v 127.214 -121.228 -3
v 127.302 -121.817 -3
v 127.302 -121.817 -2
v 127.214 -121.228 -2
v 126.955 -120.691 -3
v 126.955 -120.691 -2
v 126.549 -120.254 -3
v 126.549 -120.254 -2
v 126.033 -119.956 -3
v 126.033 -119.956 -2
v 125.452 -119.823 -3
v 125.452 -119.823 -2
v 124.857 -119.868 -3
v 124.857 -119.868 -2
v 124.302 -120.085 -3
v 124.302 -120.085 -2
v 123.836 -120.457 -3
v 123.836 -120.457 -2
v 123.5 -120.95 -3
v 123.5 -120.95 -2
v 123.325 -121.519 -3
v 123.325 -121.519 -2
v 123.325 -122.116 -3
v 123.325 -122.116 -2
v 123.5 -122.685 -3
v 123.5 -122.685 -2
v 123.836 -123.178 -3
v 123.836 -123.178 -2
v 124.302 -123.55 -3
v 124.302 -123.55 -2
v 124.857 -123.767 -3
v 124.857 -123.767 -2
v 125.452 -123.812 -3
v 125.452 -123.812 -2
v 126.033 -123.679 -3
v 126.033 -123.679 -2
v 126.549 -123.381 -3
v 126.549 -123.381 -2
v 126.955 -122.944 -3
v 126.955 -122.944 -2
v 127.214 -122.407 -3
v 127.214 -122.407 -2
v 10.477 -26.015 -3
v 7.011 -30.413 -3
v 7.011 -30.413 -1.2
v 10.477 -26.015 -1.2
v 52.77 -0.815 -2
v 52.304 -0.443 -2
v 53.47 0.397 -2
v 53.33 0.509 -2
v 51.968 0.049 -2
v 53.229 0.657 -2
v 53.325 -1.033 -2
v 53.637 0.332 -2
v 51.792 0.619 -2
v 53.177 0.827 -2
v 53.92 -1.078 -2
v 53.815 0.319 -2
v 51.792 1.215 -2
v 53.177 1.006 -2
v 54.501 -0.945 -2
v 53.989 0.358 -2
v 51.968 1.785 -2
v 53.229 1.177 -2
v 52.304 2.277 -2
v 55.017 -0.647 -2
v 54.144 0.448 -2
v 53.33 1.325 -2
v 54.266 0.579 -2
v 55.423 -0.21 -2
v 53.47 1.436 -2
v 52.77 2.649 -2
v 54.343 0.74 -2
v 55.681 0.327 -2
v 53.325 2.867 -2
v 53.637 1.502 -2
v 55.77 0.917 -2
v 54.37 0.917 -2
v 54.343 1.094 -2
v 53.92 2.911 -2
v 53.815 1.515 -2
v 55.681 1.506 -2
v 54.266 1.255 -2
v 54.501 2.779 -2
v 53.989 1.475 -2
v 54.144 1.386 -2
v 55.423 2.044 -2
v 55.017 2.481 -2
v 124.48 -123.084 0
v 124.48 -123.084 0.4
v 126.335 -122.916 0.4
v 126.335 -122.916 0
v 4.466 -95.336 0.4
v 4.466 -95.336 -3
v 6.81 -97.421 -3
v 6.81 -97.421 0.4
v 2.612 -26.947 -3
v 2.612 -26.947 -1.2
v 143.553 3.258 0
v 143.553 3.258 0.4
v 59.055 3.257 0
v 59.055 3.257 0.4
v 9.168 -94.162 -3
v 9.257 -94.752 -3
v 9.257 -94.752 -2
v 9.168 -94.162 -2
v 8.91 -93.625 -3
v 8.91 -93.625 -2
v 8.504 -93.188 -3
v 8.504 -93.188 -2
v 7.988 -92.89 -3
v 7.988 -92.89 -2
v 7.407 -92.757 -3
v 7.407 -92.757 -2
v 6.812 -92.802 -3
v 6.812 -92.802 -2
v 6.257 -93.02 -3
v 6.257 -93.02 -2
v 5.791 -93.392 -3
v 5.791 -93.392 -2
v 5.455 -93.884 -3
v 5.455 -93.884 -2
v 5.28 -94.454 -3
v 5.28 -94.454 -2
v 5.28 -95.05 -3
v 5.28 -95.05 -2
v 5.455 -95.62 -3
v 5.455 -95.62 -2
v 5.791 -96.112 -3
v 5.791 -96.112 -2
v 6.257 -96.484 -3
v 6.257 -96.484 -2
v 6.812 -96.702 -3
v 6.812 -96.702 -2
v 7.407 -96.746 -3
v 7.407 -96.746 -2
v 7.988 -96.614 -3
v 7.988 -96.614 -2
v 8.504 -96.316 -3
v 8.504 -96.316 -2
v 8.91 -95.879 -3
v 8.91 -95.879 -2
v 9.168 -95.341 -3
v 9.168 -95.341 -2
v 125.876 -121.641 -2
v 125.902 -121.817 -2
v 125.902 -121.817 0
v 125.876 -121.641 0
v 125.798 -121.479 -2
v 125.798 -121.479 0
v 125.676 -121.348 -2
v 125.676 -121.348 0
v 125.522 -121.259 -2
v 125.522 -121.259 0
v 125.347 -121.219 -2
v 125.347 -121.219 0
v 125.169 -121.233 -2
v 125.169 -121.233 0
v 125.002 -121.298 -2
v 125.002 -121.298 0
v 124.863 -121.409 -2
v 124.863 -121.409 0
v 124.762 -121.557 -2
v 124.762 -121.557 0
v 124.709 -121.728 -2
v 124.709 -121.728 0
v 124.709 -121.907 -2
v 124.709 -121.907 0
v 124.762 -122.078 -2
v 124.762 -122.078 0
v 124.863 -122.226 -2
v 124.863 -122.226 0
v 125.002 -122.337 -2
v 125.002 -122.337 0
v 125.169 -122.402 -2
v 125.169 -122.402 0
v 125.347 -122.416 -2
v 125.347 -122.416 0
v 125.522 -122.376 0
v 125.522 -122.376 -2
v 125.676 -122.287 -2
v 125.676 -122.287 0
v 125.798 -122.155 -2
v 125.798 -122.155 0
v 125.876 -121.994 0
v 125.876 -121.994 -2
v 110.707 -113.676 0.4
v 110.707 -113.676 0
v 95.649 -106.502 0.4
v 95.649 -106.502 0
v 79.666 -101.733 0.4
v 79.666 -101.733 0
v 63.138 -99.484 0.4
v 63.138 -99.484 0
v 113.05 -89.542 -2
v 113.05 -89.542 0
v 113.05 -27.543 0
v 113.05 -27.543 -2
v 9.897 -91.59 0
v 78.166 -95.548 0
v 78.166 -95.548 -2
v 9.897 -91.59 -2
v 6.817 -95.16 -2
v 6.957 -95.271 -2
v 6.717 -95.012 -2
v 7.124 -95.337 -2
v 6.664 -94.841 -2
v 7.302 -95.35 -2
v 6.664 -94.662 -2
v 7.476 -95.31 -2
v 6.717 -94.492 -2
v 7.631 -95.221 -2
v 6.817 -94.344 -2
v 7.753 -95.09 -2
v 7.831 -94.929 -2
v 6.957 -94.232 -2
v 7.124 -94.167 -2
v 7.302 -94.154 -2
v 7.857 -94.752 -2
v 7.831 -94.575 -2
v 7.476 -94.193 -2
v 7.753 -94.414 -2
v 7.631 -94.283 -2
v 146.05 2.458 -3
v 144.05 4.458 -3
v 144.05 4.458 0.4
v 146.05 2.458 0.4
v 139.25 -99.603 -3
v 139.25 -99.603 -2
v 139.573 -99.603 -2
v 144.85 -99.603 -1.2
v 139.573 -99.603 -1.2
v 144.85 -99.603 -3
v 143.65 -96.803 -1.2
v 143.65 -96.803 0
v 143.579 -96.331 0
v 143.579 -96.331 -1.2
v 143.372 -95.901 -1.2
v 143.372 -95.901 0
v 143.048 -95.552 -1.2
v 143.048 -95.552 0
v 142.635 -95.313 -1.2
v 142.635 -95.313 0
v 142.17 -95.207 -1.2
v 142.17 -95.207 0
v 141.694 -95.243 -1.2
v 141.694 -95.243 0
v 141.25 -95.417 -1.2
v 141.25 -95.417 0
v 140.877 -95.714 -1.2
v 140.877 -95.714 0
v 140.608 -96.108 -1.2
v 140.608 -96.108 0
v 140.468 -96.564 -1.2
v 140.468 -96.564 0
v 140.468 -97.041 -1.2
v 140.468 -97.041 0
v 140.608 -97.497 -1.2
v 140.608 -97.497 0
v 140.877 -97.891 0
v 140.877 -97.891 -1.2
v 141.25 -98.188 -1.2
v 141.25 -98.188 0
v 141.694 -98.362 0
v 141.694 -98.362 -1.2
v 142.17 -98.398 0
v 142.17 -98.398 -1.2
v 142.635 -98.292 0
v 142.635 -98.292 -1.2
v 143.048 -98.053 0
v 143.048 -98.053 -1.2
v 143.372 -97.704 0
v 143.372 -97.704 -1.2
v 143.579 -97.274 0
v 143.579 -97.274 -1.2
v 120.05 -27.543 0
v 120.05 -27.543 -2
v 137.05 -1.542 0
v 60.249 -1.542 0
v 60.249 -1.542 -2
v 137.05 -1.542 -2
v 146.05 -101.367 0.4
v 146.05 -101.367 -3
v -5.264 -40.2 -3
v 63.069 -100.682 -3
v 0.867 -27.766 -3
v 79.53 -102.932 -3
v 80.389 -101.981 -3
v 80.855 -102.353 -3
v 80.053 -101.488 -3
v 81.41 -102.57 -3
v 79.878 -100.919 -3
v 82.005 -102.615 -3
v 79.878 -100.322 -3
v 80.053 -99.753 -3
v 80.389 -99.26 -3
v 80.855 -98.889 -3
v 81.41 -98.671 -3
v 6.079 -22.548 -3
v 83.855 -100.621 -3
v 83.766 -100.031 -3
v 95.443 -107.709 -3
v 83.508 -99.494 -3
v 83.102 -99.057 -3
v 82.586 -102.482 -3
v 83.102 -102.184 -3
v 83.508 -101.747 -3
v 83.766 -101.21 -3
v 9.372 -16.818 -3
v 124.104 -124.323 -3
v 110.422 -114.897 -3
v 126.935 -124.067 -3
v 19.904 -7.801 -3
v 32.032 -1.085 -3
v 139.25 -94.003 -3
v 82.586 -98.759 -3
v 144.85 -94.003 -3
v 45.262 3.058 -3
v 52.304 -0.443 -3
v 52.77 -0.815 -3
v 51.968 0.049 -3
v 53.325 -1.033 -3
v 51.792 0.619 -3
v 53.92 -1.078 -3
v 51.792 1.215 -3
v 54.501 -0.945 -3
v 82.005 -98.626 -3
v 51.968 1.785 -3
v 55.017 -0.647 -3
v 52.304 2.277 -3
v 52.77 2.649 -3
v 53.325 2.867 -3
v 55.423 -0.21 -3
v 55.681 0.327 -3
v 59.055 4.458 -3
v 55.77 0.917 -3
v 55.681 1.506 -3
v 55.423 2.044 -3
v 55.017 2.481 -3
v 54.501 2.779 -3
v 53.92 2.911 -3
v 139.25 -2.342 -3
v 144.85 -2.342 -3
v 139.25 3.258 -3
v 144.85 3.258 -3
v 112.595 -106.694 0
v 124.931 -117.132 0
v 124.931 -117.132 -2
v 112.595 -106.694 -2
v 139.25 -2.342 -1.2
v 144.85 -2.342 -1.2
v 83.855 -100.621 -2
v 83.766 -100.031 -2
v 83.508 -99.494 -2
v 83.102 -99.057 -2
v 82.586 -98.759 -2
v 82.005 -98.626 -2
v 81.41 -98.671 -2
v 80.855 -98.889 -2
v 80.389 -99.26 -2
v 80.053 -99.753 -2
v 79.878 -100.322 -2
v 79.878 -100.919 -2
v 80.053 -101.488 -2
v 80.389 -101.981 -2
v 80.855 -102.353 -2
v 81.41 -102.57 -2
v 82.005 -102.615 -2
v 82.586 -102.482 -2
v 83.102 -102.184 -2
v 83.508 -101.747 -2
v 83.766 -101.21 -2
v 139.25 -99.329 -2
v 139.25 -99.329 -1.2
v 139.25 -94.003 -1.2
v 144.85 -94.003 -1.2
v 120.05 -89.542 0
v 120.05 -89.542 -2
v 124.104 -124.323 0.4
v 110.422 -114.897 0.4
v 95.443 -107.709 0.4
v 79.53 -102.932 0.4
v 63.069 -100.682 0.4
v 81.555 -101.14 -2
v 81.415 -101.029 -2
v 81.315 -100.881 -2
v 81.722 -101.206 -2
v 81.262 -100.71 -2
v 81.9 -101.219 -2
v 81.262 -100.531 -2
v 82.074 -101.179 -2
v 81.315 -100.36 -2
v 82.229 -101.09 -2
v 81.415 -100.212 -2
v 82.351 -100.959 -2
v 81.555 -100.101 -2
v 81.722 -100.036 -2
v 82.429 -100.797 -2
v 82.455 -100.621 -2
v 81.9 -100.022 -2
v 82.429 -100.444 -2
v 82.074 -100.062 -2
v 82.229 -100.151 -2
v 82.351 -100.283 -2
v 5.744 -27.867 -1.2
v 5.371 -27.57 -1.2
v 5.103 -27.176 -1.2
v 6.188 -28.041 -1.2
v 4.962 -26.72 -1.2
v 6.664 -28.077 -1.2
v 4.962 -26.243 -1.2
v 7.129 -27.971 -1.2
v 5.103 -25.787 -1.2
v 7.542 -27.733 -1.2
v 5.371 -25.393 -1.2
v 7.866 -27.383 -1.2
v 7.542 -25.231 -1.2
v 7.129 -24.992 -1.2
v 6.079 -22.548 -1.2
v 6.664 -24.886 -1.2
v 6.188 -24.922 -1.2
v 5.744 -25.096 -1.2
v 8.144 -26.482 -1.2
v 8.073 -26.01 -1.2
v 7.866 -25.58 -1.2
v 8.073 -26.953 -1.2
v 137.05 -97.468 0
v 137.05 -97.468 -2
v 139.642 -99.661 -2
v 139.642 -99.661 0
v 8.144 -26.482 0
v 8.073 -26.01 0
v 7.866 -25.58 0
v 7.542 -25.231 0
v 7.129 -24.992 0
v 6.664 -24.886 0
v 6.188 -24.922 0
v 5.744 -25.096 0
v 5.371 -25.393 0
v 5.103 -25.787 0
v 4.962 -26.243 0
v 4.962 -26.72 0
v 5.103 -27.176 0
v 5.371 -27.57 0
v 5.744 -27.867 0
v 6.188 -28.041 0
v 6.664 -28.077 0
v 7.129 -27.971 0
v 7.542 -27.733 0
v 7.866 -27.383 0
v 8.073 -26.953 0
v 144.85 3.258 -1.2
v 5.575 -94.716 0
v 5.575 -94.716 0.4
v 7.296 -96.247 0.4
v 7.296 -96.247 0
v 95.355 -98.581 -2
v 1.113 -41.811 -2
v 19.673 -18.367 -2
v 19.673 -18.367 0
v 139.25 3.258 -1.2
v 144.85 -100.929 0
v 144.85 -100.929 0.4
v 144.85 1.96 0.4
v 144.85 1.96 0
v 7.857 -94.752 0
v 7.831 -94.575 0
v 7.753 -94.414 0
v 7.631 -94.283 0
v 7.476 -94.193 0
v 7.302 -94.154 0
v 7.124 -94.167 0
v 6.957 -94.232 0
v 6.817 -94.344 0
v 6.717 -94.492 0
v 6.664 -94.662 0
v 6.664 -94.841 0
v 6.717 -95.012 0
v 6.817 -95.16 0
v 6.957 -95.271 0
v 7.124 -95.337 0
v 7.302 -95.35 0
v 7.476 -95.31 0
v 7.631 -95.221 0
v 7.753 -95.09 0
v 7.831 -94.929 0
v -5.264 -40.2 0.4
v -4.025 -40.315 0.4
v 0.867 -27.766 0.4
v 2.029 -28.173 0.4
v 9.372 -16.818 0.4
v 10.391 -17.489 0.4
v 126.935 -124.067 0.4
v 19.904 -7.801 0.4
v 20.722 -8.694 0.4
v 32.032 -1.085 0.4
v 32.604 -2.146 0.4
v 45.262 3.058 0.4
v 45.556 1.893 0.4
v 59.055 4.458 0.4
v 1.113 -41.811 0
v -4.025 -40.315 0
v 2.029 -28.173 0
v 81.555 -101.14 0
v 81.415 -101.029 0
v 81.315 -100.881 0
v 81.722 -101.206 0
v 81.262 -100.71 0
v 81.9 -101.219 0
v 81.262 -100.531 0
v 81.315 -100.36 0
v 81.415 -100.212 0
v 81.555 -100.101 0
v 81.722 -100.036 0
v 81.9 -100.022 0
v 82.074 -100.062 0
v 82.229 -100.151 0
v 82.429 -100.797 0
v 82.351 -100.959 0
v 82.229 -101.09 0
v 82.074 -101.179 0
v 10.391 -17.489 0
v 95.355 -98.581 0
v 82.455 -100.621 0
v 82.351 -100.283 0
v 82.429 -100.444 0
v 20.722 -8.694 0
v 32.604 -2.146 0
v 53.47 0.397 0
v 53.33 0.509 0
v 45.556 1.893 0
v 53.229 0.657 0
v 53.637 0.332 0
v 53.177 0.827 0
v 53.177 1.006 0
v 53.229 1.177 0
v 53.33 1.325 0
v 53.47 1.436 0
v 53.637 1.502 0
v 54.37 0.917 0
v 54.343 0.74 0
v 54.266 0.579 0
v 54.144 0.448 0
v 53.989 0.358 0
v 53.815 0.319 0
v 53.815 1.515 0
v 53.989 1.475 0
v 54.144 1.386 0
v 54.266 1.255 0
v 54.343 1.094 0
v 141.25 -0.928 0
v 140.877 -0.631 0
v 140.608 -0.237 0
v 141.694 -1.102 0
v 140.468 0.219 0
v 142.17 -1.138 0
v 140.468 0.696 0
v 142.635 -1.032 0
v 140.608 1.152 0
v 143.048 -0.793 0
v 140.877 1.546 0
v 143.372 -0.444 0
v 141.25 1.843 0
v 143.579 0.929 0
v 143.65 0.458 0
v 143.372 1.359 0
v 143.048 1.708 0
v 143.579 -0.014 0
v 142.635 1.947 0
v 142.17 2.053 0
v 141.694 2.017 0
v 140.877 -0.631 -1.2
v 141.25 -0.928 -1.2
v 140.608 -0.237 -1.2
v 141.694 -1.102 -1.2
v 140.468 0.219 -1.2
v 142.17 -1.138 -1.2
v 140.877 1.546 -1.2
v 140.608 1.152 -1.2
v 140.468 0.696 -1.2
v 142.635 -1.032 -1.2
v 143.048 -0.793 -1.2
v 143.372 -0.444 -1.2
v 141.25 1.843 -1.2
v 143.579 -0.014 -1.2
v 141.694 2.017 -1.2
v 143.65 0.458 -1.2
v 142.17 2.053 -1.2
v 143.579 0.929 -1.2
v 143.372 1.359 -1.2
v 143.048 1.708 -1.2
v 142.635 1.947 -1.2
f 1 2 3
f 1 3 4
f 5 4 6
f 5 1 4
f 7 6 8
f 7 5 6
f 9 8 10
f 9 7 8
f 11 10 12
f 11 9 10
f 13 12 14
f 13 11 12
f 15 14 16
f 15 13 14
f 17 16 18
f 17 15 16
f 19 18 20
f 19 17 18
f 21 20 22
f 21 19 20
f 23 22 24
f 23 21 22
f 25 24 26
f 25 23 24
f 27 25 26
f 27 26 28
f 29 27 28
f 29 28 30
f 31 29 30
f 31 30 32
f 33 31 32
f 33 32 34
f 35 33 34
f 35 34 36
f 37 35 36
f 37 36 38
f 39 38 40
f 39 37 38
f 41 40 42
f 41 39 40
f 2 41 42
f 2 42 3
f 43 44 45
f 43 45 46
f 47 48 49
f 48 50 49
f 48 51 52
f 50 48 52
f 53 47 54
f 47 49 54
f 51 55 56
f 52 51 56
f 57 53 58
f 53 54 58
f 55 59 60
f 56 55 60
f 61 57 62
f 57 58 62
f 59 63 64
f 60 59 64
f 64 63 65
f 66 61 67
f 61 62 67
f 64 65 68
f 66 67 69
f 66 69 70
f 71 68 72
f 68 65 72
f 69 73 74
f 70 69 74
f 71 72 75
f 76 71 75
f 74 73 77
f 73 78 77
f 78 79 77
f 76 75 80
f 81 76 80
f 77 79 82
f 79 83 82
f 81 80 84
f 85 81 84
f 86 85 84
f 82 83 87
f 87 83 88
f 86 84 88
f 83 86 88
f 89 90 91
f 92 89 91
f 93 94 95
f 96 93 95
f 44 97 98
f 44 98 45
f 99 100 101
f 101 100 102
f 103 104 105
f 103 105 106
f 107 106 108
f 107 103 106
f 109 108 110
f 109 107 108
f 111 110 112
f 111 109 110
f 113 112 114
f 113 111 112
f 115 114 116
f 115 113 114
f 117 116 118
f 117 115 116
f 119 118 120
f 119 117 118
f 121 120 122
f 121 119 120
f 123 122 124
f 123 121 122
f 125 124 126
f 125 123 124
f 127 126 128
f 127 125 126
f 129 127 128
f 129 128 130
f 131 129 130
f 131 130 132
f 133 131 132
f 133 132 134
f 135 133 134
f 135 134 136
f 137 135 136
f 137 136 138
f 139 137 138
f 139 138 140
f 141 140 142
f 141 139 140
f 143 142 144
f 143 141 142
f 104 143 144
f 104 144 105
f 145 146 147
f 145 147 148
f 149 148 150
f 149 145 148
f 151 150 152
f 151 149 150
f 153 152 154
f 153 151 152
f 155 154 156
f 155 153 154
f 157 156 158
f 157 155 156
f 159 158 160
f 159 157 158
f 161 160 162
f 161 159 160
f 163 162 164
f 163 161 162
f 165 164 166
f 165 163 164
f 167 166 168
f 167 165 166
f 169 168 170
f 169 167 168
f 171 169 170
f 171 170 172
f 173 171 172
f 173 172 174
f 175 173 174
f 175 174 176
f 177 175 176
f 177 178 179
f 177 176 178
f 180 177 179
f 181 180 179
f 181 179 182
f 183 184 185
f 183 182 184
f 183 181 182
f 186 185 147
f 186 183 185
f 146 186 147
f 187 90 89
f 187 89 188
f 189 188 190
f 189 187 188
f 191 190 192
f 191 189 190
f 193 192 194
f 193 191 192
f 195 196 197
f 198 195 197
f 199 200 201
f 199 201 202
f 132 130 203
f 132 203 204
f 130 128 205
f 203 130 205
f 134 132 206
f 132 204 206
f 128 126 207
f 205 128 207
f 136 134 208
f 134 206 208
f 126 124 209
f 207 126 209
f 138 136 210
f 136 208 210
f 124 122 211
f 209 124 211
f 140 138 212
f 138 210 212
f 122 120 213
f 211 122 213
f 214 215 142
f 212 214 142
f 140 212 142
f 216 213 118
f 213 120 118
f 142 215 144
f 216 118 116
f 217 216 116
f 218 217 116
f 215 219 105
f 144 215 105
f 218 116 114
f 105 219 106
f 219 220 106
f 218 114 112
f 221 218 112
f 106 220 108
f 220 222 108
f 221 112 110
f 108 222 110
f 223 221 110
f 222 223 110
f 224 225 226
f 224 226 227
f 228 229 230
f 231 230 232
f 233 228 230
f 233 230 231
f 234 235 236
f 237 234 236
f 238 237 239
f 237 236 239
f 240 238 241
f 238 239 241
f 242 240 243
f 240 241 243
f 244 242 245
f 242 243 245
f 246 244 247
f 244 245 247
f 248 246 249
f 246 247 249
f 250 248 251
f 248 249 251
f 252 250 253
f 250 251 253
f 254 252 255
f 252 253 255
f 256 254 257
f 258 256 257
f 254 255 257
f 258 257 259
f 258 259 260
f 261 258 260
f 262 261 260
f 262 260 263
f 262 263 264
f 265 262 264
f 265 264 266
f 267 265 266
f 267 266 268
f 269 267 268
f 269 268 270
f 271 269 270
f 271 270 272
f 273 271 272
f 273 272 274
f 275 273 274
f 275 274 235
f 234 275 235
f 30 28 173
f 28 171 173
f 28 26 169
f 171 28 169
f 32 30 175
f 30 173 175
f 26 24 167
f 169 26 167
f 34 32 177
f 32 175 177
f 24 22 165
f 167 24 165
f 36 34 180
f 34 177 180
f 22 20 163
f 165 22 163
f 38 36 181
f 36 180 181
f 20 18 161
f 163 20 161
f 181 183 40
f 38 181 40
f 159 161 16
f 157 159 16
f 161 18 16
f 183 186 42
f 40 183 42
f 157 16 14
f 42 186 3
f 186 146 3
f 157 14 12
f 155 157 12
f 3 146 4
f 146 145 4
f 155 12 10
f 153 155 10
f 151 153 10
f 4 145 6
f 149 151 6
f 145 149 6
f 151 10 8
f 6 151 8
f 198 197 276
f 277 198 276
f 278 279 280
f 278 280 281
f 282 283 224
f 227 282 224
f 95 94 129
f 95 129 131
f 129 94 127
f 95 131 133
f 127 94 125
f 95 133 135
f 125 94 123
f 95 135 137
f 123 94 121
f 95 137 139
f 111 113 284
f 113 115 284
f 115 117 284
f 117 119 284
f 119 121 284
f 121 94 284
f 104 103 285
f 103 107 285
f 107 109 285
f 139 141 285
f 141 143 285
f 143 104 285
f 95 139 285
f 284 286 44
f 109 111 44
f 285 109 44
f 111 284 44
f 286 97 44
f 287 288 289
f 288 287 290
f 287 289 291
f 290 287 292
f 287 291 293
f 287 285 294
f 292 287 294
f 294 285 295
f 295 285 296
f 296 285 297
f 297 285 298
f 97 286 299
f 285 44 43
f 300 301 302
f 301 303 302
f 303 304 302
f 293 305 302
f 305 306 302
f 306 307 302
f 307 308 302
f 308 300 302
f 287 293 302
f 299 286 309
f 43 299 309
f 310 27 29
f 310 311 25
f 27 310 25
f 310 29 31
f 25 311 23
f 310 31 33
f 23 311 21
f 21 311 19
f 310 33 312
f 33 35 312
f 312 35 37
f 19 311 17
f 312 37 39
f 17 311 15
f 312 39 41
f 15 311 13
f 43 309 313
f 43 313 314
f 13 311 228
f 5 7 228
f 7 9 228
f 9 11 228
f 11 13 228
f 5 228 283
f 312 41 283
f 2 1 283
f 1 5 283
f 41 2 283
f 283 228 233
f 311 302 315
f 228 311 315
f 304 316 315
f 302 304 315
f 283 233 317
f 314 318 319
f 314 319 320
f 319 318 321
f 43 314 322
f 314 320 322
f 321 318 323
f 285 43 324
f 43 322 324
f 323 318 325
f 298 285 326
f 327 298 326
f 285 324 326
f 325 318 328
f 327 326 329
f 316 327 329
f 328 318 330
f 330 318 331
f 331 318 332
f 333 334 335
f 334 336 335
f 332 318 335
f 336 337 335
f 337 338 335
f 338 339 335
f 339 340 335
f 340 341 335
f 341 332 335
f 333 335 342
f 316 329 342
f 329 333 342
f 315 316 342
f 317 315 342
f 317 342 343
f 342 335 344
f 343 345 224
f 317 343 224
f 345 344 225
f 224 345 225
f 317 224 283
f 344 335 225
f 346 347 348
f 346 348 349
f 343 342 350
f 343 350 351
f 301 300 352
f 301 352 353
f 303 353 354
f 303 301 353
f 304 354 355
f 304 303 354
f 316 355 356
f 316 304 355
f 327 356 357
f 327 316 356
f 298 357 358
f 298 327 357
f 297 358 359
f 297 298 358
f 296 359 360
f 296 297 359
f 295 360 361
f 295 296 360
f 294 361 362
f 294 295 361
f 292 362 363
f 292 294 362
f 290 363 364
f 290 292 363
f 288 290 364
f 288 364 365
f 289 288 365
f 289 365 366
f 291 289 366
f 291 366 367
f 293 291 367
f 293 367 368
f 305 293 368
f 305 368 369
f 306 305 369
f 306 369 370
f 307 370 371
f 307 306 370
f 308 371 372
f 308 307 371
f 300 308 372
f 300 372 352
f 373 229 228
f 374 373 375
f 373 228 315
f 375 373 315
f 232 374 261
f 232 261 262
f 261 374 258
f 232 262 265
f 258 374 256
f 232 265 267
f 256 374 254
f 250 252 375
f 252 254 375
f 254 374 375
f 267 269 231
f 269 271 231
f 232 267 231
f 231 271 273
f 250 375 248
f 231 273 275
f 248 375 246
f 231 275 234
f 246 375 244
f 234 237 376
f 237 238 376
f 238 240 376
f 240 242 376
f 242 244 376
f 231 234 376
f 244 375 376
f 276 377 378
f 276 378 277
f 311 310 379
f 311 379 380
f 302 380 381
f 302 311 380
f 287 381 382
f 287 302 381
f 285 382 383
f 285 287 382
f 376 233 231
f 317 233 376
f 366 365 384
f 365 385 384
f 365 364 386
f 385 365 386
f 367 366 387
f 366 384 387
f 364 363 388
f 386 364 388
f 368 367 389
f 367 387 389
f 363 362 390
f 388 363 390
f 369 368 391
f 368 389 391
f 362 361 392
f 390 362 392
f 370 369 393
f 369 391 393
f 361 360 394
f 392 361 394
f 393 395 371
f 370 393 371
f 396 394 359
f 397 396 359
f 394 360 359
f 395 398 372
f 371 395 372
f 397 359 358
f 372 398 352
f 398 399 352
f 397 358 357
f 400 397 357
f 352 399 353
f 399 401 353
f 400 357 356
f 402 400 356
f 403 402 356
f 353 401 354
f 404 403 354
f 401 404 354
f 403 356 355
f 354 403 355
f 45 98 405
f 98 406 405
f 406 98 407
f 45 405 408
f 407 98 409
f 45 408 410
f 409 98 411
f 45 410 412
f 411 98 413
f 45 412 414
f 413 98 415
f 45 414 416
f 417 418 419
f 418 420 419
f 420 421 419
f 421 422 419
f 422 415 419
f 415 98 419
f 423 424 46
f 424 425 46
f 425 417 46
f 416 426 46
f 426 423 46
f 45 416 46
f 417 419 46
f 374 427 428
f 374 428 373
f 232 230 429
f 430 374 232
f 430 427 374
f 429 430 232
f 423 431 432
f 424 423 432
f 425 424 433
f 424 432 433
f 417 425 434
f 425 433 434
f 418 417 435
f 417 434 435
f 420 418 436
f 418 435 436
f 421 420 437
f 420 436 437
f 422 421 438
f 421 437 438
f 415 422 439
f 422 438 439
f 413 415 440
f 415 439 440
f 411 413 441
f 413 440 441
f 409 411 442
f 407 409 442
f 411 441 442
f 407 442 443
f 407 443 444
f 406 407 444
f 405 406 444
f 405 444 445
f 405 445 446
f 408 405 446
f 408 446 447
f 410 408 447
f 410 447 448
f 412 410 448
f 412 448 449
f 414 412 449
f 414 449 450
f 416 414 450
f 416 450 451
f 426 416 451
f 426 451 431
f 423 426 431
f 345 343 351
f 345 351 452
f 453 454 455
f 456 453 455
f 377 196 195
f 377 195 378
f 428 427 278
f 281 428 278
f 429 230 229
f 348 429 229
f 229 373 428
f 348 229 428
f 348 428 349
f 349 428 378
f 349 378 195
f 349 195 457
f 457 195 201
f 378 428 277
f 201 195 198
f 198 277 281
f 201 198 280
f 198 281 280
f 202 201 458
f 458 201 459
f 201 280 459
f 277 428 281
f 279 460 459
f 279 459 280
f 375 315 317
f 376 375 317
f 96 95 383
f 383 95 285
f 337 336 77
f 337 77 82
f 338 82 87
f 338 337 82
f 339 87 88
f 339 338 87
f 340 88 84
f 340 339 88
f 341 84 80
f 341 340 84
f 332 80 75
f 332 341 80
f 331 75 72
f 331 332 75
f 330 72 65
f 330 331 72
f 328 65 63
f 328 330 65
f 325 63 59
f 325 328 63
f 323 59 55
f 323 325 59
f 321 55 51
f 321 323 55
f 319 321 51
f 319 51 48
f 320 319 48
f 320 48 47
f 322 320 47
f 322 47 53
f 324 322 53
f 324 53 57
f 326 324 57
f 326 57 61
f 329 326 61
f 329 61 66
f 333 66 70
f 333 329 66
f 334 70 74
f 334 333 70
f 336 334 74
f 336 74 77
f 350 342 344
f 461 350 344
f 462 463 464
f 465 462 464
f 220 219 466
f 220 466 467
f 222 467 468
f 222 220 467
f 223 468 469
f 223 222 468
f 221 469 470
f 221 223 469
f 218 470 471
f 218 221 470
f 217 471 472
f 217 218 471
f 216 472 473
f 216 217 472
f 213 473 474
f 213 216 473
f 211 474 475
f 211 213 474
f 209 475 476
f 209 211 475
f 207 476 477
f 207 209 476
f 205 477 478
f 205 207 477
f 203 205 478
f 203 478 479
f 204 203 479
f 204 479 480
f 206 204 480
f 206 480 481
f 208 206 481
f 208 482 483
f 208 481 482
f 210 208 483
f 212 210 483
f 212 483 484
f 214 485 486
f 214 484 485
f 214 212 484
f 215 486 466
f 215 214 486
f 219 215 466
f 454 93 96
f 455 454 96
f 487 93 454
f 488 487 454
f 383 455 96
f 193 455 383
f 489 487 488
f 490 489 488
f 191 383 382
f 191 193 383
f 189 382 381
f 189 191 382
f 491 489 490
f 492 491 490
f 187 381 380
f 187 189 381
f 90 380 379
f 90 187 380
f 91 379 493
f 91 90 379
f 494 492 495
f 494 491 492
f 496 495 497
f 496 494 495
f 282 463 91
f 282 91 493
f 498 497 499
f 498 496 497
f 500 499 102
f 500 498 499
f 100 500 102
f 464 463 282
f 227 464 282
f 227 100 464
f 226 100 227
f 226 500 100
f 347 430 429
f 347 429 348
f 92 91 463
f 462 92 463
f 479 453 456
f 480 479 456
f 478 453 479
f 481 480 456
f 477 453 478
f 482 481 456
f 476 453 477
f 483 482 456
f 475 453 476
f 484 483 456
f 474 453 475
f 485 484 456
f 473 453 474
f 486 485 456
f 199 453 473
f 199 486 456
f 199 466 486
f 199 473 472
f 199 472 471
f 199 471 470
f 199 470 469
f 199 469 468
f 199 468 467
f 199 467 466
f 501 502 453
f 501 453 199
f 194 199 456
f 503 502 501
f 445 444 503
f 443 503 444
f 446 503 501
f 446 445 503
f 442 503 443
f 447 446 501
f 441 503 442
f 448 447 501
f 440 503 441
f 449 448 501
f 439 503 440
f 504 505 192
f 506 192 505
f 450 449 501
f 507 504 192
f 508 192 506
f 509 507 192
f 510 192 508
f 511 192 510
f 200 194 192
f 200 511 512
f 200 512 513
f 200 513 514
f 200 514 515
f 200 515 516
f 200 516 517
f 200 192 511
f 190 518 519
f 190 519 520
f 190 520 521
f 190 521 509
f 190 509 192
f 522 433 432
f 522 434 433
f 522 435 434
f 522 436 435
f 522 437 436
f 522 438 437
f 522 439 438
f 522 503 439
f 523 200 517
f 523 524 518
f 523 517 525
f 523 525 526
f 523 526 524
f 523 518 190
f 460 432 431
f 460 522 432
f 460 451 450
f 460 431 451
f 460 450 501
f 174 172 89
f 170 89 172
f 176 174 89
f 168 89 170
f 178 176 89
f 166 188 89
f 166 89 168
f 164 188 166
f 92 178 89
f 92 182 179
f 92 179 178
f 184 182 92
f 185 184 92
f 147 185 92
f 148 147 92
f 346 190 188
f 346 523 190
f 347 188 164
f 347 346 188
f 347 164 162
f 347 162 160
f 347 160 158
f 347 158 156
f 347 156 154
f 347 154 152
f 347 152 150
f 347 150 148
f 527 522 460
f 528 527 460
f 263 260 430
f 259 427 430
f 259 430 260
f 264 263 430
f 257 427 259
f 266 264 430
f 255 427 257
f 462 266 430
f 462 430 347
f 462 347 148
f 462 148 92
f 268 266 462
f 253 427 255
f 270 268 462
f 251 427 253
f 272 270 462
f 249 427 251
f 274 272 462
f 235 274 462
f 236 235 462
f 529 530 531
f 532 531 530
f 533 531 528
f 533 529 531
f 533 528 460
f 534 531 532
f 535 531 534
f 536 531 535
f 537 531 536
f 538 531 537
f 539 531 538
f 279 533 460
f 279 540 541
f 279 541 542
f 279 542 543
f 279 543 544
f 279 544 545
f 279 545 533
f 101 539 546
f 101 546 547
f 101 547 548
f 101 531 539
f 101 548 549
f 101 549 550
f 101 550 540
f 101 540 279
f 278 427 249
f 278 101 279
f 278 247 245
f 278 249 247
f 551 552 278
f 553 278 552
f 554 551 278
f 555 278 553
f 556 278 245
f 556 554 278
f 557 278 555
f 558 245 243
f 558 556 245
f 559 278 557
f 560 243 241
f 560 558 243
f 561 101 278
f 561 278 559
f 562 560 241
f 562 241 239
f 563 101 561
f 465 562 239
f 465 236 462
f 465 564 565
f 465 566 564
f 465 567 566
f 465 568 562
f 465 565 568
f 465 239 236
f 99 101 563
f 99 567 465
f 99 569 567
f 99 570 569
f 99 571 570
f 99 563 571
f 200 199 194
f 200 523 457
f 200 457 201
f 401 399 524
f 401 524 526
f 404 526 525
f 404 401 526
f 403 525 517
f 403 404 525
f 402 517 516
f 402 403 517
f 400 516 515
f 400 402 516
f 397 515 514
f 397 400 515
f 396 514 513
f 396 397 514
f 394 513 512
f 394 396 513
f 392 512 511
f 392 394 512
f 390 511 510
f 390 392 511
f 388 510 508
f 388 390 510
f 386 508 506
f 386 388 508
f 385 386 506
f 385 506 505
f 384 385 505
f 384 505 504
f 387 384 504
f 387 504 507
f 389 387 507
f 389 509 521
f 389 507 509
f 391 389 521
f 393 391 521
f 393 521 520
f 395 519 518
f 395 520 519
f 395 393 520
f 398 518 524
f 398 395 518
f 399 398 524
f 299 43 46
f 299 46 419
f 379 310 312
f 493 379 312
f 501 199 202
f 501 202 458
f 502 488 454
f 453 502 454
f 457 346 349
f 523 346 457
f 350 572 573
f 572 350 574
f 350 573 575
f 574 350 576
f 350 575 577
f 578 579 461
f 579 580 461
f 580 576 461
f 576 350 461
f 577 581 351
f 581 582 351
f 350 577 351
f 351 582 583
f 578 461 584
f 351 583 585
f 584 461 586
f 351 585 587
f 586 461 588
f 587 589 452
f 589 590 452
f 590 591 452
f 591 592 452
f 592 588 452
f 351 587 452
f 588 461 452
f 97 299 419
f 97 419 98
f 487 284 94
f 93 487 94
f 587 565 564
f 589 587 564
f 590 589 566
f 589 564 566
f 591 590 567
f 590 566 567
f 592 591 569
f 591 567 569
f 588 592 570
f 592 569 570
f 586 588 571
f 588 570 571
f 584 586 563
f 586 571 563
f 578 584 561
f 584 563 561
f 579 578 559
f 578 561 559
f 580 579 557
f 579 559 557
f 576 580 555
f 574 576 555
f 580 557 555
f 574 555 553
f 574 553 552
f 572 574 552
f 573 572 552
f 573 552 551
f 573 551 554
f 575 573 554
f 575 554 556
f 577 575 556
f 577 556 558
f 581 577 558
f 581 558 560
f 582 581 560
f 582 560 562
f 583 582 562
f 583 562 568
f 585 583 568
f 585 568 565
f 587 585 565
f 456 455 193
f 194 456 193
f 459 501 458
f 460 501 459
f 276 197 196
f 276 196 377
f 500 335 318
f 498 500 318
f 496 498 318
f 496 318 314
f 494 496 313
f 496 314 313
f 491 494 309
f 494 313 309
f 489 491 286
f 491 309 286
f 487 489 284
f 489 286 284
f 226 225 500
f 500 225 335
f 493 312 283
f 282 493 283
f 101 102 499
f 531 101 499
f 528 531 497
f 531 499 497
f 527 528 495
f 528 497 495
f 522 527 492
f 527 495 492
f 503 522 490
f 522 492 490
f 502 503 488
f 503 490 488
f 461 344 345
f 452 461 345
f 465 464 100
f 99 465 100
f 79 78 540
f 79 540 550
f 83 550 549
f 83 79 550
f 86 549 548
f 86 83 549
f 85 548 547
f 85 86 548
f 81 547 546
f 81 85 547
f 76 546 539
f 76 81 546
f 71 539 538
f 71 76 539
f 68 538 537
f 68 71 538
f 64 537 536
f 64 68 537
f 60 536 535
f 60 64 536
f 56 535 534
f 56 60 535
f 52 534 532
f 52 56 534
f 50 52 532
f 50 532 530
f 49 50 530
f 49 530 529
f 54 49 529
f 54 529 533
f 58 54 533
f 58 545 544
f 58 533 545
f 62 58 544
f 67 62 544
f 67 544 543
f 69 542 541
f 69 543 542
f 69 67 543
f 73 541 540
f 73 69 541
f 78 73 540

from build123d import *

# Parameters (mm, degrees)
PAD001_DEPTH         = 3.4
POCKET006_DEPTH      = 0.4
SKETCH011_R          = 1.6
SKETCH011_W          = 7
SKETCH011_H          = 62
POCKET007_DEPTH      = 2
SKETCH012_W          = 5.6
SKETCH012_H          = 5.6
POCKET008_DEPTH      = 1.8
SKETCH014_R          = 0.6
POCKET010_DEPTH      = 0.001
POCKET010_DEPTH_BACK = 3.401
SKETCH016_R          = 2
POCKET012_DEPTH      = 1


with BuildPart() as part:
    # Sketch009 → Pad001 (new body)
    with BuildSketch(Plane(origin=(-70.9, 59.5, 0), x_dir=(1, 0, 0), z_dir=(0, 0, 1))):
        with BuildLine():
            ThreePointArc((129.954505, -55.0425), (90.803609, -67.301419), (65.635795, -99.699797))
            Line((65.635795, -99.699797), (75.365663, -154.835718))
            Line((75.365663, -154.835718), (77.709881, -156.921033))
            Line((77.709881, -156.921033), (133.968943, -160.182427))
            ThreePointArc((195.00443, -183.822904), (166.343475, -167.208769), (133.968943, -160.182427))
            Line((195.00443, -183.822904), (197.834526, -183.566965))
            Line((197.834526, -183.566965), (216.95, -160.867339))
            Line((216.95, -160.867339), (216.95, -57.0425))
            Line((214.95, -55.0425), (216.95, -57.0425))
            Line((214.95, -55.0425), (129.954505, -55.0425))
        make_face()
    extrude(amount=PAD001_DEPTH)

    # Sketch010 → Pocket006 (cut)
    with BuildSketch(Plane(origin=(-70.9, 59.5, 3.4), x_dir=(1, 0, 0), z_dir=(0, 0, 1))):
        with BuildLine():
            ThreePointArc((129.954505, -56.2425), (91.621754, -68.194493), (66.874586, -99.814544))
            Line((66.874586, -99.814544), (76.474909, -154.216377))
            Line((76.474909, -154.216377), (78.195777, -155.747186))
            Line((78.195777, -155.747186), (134.038391, -158.984439))
            ThreePointArc((195.379997, -182.584043), (166.5491, -166.00184), (134.038391, -158.984439))
            Line((195.379997, -182.584043), (197.234685, -182.416314))
            Line((197.234685, -182.416314), (215.75, -160.429378))
            Line((215.75, -160.429378), (215.75, -57.539556))
            Line((215.75, -57.539556), (214.452944, -56.2425))
            Line((214.452944, -56.2425), (129.954505, -56.2425))
        make_face()
    extrude(amount=-POCKET006_DEPTH, mode=Mode.SUBTRACT)

    # Sketch011 → Pocket007 (cut)
    with BuildSketch(Plane(origin=(-70.9, 59.5, 3), x_dir=(1, 0, 0), z_dir=(0, 0, 1))):
        with Locations((212.95, -59.0425)):
            Circle(SKETCH011_R)
        with Locations((212.95, -156.302532)):
            Circle(SKETCH011_R)
        with Locations((77.4441, -85.981596)):
            Circle(SKETCH011_R)
        Polygon((72.012841, -101.311041), (90.572874, -77.866788), (131.149099, -61.0425), (207.95, -61.0425), (207.95, -87.0425), (207.95, -156.967837), (210.542474, -159.161469), (195.830749, -176.631643), (183.495202, -166.193872), (166.255124, -158.080894), (149.066225, -155.047559), (80.797353, -151.089943), align=None)
        with Locations((187.45, -118.0425)):
            Rectangle(SKETCH011_W, SKETCH011_H, mode=Mode.SUBTRACT)
    extrude(amount=-POCKET007_DEPTH, mode=Mode.SUBTRACT)

    # Sketch012 → Pocket008 (cut)
    with BuildSketch(Plane(origin=(-70.9, 59.5, 0), x_dir=(1, 0, 0), z_dir=(0, 0, 1))):
        Polygon((81.377006, -85.514821), (76.978793, -82.04845), (73.512422, -86.446662), (77.910635, -89.913033), align=None)
        with Locations((212.95, -59.0425)):
            Rectangle(SKETCH012_W, SKETCH012_H)
        with Locations((212.95, -156.302532)):
            Rectangle(SKETCH012_W, SKETCH012_H)
    extrude(amount=POCKET008_DEPTH, mode=Mode.SUBTRACT)

    # Sketch014 → Pocket010 (cut, two sides)
    with BuildSketch(Plane(origin=(-70.9, 59.5, 0), x_dir=(1, 0, 0), z_dir=(0, 0, 1))) as pocket010_sk:
        with Locations((78.157217, -154.251862)):
            Circle(SKETCH014_R)
        with Locations((152.755217, -160.120567)):
            Circle(SKETCH014_R)
        with Locations((124.670042, -58.583126)):
            Circle(SKETCH014_R)
        with Locations((196.202376, -181.31749)):
            Circle(SKETCH014_R)
    extrude(amount=-POCKET010_DEPTH, mode=Mode.SUBTRACT)
    extrude(pocket010_sk.sketch, amount=POCKET010_DEPTH_BACK, mode=Mode.SUBTRACT)

    # Sketch016 → Pocket012 (cut)
    with BuildSketch(Plane(origin=(-70.9, 59.5, 0), x_dir=(1, 0, 0), z_dir=(0, 0, 1))):
        with Locations((78.157217, -154.251862)):
            Circle(SKETCH016_R)
        with Locations((152.755217, -160.120567)):
            Circle(SKETCH016_R)
        with Locations((124.670042, -58.583126)):
            Circle(SKETCH016_R)
        with Locations((196.202376, -181.31749)):
            Circle(SKETCH016_R)
    extrude(amount=POCKET012_DEPTH, mode=Mode.SUBTRACT)


with BuildPart() as part_1:
    # Body001 placement: moved
    add(part.part.moved(Location((0, 0, -3))))


solid = part_1.part
